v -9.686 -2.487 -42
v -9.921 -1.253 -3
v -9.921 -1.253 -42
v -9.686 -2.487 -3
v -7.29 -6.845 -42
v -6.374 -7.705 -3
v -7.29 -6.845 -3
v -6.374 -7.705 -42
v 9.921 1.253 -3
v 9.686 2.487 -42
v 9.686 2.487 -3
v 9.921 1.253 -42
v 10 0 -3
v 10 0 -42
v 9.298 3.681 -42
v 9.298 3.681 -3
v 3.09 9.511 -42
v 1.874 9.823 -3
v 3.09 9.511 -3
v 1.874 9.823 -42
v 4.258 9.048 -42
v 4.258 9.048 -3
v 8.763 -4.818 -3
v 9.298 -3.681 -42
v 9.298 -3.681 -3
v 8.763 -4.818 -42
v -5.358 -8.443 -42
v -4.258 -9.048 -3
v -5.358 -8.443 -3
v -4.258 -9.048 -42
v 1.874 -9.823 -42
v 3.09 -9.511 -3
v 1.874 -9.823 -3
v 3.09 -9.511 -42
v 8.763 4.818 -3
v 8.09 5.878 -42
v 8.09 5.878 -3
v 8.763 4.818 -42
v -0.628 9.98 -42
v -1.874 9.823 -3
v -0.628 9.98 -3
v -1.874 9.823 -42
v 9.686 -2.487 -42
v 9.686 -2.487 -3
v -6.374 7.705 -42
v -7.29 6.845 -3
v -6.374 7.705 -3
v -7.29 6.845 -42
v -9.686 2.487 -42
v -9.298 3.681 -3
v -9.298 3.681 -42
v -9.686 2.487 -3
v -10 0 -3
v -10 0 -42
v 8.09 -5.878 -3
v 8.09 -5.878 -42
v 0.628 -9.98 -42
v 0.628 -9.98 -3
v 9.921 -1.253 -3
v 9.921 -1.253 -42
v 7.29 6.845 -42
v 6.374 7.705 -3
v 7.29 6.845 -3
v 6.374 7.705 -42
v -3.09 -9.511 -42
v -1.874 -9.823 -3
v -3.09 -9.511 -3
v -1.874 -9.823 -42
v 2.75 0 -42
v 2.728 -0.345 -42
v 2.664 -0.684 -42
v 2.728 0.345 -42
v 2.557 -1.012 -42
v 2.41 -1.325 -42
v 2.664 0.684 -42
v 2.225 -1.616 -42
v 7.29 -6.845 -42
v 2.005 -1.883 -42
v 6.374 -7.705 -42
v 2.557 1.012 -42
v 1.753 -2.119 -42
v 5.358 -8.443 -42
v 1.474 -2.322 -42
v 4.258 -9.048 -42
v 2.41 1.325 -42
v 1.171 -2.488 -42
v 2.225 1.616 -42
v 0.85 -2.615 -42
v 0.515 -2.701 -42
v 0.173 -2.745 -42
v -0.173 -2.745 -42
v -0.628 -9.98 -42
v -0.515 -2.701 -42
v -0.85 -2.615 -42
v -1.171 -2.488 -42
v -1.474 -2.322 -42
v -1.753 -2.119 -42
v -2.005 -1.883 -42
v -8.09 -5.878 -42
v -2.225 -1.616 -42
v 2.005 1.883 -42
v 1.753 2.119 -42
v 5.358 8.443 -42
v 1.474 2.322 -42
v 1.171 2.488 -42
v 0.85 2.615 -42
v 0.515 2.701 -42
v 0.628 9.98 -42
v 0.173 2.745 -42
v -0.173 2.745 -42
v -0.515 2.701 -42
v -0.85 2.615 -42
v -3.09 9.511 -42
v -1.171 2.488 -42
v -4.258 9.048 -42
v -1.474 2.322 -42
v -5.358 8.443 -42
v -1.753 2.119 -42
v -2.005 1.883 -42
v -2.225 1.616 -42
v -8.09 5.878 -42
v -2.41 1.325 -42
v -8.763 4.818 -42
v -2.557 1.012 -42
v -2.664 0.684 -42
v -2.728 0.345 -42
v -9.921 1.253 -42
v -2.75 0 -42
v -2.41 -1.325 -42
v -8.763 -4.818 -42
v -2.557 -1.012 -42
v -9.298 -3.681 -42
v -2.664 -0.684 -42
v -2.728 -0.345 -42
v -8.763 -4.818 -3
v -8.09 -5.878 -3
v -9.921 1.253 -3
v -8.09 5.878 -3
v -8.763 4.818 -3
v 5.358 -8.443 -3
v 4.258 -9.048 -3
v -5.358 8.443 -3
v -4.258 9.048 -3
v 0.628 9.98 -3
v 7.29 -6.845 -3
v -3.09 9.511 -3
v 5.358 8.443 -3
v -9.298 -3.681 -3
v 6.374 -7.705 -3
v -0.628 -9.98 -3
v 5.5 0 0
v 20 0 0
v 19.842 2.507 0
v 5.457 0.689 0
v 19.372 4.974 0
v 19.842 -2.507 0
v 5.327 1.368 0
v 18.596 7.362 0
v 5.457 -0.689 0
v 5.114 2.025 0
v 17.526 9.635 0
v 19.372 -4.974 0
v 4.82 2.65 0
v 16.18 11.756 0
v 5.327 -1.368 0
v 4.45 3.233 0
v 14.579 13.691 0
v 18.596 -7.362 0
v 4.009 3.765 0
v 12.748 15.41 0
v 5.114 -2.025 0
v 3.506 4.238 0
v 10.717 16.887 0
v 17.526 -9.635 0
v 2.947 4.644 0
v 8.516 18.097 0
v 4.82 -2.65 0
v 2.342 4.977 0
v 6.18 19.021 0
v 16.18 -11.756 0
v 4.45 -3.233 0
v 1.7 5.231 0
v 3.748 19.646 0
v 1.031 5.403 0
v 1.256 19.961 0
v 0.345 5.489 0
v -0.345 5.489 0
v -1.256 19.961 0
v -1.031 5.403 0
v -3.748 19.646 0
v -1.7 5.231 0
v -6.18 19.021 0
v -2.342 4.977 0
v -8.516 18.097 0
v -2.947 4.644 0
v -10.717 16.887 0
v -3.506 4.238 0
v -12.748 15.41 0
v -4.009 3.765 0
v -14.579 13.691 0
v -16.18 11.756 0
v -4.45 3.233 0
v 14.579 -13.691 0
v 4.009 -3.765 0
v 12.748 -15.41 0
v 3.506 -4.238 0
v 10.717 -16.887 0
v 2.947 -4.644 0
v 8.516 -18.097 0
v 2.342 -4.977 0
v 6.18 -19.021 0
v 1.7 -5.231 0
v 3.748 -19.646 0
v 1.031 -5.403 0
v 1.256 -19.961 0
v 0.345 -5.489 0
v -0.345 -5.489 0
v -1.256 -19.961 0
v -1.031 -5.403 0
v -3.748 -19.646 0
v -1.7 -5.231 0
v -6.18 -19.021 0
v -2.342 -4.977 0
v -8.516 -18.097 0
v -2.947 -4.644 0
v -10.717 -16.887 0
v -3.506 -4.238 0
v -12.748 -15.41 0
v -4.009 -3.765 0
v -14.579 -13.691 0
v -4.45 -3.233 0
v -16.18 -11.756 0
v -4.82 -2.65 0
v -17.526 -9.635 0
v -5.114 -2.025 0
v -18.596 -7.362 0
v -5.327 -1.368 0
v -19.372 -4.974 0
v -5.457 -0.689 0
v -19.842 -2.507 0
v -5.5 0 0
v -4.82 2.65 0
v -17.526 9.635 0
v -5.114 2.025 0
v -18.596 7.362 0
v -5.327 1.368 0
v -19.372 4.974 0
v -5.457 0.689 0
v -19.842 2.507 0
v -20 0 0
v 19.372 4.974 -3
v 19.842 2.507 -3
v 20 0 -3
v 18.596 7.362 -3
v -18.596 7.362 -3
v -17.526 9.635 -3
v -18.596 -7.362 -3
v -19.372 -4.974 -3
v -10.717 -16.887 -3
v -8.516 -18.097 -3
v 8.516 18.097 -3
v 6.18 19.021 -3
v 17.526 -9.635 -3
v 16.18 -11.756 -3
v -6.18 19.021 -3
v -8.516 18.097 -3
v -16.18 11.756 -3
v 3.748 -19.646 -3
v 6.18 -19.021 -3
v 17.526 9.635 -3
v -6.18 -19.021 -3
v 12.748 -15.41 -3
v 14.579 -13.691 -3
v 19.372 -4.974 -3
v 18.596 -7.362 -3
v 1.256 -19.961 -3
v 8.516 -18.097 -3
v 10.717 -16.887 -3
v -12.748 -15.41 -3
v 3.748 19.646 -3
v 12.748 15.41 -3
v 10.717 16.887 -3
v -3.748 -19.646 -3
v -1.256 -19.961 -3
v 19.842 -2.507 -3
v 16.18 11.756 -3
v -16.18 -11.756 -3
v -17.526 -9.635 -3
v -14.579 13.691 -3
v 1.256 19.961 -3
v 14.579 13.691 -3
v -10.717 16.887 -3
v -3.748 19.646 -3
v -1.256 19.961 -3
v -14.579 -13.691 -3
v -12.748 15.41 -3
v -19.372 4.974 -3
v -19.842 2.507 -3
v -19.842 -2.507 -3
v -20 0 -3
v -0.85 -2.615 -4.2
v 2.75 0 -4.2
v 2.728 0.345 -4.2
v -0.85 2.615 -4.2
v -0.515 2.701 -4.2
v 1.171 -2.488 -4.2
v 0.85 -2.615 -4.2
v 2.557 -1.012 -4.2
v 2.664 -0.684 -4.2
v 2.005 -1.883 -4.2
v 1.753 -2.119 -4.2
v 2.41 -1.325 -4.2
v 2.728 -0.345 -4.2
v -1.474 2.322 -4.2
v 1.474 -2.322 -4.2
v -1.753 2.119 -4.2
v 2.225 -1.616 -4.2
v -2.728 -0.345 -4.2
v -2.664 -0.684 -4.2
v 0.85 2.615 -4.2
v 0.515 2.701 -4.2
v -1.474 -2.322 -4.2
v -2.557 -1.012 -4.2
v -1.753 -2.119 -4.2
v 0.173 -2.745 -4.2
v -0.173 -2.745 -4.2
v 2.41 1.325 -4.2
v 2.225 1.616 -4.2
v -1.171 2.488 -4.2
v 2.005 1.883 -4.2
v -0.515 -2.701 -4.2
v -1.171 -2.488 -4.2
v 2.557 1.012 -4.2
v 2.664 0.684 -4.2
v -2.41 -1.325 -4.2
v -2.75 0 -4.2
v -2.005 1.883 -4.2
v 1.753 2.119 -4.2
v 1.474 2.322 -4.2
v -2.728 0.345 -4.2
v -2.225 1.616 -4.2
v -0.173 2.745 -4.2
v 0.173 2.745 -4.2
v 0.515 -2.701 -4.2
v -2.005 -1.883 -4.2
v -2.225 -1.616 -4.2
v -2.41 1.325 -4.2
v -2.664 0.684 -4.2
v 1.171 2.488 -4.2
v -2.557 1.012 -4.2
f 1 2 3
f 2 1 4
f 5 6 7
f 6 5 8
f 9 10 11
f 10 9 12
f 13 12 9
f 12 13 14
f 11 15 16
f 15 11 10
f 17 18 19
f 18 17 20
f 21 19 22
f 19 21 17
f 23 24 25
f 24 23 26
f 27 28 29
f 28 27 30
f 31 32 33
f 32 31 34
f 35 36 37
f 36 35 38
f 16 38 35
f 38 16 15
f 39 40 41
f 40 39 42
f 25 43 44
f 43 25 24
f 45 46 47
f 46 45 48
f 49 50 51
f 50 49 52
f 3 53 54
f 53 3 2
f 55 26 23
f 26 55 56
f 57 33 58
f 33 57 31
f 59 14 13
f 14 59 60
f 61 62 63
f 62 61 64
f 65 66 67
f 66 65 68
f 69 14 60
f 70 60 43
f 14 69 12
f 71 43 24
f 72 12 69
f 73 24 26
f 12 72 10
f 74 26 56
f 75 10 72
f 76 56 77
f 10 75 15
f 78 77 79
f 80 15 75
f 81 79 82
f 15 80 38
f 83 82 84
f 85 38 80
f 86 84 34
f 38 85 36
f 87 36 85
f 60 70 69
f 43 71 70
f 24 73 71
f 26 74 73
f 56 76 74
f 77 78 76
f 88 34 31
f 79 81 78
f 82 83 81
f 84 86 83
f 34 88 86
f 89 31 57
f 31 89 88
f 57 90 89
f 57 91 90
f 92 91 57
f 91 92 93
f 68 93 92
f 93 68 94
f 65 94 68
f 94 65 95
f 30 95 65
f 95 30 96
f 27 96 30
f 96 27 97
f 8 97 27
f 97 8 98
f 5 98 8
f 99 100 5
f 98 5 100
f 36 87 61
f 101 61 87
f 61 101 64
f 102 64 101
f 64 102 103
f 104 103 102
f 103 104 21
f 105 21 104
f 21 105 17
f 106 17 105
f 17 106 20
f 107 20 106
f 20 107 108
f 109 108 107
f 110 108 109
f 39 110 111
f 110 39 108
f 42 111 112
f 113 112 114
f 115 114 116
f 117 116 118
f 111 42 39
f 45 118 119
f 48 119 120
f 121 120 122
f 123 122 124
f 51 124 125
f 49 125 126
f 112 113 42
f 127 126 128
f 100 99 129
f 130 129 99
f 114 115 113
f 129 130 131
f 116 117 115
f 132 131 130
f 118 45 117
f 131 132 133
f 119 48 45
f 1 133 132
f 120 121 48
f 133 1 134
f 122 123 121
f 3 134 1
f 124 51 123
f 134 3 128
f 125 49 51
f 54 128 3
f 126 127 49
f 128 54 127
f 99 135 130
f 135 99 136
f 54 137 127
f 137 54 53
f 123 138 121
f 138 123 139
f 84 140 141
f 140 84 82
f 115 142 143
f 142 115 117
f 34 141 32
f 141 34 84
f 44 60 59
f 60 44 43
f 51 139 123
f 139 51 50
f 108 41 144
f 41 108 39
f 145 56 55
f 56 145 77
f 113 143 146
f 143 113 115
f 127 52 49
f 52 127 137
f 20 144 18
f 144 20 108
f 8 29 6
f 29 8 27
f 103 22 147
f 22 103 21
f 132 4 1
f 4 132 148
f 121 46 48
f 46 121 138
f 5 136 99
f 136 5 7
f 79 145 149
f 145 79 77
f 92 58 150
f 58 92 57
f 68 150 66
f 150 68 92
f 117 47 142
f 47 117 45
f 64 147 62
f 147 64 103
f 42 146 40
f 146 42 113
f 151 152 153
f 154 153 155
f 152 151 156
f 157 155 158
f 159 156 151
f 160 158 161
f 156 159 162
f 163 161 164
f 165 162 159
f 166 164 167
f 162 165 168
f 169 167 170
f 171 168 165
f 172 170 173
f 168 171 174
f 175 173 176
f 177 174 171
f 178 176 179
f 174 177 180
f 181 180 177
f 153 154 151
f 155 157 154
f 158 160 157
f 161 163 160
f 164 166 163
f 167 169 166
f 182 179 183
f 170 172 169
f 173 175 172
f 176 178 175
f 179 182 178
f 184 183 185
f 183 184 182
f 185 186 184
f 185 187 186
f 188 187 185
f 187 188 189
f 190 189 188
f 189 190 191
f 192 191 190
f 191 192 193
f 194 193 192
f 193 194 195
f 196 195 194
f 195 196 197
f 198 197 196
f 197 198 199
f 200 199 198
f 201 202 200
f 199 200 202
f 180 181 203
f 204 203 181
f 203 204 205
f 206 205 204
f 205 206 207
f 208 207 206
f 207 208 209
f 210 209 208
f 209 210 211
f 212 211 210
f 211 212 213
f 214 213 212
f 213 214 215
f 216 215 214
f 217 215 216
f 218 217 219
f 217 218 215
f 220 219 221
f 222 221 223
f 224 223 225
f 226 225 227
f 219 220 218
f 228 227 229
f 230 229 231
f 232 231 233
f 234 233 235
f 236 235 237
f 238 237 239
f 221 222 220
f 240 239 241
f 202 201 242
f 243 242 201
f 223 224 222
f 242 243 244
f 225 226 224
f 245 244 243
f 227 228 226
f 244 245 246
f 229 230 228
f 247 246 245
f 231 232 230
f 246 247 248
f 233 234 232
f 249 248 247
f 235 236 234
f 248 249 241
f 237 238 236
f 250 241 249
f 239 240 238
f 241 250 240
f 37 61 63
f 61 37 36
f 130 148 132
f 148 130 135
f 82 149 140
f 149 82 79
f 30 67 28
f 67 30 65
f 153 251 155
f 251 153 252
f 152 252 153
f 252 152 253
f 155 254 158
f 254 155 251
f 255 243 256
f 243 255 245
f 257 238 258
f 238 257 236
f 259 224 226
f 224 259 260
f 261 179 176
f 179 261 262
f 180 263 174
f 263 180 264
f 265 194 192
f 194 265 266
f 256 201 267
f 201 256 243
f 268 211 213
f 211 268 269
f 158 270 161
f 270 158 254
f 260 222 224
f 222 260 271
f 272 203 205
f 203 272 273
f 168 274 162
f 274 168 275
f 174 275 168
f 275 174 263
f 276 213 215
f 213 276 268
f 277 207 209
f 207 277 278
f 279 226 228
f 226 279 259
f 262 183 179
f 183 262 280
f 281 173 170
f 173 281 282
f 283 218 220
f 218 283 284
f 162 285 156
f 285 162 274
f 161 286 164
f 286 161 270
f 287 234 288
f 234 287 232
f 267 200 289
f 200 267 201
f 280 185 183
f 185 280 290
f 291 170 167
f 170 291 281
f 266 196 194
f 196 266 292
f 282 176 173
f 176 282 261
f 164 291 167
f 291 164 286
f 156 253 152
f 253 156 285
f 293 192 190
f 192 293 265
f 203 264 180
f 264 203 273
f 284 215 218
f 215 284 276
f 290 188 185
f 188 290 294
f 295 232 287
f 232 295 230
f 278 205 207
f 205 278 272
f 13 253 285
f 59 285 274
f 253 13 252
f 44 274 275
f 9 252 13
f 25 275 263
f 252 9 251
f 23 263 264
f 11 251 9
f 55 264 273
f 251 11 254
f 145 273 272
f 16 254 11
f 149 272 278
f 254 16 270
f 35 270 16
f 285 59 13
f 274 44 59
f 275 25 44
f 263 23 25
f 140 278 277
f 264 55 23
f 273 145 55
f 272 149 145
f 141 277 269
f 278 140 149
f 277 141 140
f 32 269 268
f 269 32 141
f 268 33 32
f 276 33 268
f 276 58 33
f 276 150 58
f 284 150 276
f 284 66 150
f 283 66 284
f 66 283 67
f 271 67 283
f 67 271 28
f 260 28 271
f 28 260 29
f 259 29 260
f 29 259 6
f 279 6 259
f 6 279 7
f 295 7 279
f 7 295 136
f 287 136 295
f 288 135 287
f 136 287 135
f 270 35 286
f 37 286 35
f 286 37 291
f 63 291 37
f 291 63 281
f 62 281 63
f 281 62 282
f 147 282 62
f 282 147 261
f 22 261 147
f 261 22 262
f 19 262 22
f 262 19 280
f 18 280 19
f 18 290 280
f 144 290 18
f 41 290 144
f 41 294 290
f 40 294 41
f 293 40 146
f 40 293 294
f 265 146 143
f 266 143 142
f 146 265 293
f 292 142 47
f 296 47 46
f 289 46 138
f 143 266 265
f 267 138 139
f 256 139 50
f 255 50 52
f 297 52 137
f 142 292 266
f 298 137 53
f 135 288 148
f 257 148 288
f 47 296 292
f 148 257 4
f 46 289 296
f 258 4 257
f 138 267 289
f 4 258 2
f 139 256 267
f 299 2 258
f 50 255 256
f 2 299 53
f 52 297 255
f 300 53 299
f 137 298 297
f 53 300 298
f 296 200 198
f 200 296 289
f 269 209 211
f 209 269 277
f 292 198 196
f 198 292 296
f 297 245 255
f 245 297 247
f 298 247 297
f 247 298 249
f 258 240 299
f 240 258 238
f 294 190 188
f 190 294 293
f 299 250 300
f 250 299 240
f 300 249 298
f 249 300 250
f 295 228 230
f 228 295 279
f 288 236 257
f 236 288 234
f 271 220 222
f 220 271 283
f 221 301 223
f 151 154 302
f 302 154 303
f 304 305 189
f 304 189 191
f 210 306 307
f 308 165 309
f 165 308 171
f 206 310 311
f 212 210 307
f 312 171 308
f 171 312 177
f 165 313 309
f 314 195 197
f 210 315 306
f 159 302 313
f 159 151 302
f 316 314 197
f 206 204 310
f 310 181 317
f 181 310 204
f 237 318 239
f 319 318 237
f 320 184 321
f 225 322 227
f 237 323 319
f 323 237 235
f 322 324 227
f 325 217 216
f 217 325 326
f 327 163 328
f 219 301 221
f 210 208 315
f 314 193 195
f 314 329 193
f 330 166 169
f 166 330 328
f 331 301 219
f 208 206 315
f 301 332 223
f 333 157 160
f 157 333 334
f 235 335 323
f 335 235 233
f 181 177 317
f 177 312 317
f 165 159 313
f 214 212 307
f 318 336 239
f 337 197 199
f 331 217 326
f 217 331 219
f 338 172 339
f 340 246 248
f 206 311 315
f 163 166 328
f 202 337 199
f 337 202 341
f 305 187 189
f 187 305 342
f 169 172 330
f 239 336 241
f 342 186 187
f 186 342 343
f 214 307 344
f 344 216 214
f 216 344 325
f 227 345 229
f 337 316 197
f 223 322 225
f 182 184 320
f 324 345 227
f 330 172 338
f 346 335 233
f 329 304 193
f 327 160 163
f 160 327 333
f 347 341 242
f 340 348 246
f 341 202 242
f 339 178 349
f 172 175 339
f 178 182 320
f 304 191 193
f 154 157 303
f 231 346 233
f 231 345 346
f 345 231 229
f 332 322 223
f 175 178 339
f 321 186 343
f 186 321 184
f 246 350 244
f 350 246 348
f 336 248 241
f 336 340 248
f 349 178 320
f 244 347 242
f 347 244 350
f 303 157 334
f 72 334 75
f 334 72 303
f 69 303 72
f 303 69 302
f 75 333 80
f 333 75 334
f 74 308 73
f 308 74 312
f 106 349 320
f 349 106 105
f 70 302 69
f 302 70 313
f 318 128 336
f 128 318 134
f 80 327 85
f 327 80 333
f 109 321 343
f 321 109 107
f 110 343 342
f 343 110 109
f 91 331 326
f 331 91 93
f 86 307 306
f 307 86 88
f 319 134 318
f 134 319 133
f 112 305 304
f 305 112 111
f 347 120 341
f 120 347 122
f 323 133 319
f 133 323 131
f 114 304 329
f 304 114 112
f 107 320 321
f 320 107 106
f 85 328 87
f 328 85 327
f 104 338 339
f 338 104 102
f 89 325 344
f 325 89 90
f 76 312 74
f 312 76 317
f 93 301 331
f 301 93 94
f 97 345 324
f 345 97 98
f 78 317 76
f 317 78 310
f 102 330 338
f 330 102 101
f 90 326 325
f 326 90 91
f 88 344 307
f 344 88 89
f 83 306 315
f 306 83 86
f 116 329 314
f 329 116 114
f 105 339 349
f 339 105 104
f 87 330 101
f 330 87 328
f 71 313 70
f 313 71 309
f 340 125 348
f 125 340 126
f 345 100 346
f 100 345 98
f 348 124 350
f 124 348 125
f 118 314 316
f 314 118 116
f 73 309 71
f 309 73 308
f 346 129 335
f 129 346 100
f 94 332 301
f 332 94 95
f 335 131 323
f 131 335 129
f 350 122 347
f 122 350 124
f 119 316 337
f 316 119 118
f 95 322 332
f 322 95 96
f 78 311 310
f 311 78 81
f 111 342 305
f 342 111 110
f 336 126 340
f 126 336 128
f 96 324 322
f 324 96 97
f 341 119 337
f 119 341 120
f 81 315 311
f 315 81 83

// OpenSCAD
$fn = 50;


difference() {
	union() {
		translate(v = [0, 0, -42.0000000000]) {
			cylinder(h = 42, r = 10.0000000000);
		}
		translate(v = [0, 0, -3.0000000000]) {
			cylinder(h = 3, r = 20.0000000000);
		}
	}
	union() {
		translate(v = [0, 0, 0]) {
			rotate(a = [0, 0, 0]) {
				difference() {
					union() {
						#translate(v = [0, 0, -42.0000000000]) {
							cylinder(h = 42, r = 2.2500000000);
						}
						#translate(v = [0, 0, -4.2000000000]) {
							cylinder(h = 4.2000000000, r1 = 2.7500000000, r2 = 5.5000000000);
						}
						#translate(v = [0, 0, -42.0000000000]) {
							cylinder(h = 42, r = 2.7500000000);
						}
						#translate(v = [0, 0, -42.0000000000]) {
							cylinder(h = 42, r = 2.2500000000);
						}
					}
					union();
				}
			}
		}
	}
}
